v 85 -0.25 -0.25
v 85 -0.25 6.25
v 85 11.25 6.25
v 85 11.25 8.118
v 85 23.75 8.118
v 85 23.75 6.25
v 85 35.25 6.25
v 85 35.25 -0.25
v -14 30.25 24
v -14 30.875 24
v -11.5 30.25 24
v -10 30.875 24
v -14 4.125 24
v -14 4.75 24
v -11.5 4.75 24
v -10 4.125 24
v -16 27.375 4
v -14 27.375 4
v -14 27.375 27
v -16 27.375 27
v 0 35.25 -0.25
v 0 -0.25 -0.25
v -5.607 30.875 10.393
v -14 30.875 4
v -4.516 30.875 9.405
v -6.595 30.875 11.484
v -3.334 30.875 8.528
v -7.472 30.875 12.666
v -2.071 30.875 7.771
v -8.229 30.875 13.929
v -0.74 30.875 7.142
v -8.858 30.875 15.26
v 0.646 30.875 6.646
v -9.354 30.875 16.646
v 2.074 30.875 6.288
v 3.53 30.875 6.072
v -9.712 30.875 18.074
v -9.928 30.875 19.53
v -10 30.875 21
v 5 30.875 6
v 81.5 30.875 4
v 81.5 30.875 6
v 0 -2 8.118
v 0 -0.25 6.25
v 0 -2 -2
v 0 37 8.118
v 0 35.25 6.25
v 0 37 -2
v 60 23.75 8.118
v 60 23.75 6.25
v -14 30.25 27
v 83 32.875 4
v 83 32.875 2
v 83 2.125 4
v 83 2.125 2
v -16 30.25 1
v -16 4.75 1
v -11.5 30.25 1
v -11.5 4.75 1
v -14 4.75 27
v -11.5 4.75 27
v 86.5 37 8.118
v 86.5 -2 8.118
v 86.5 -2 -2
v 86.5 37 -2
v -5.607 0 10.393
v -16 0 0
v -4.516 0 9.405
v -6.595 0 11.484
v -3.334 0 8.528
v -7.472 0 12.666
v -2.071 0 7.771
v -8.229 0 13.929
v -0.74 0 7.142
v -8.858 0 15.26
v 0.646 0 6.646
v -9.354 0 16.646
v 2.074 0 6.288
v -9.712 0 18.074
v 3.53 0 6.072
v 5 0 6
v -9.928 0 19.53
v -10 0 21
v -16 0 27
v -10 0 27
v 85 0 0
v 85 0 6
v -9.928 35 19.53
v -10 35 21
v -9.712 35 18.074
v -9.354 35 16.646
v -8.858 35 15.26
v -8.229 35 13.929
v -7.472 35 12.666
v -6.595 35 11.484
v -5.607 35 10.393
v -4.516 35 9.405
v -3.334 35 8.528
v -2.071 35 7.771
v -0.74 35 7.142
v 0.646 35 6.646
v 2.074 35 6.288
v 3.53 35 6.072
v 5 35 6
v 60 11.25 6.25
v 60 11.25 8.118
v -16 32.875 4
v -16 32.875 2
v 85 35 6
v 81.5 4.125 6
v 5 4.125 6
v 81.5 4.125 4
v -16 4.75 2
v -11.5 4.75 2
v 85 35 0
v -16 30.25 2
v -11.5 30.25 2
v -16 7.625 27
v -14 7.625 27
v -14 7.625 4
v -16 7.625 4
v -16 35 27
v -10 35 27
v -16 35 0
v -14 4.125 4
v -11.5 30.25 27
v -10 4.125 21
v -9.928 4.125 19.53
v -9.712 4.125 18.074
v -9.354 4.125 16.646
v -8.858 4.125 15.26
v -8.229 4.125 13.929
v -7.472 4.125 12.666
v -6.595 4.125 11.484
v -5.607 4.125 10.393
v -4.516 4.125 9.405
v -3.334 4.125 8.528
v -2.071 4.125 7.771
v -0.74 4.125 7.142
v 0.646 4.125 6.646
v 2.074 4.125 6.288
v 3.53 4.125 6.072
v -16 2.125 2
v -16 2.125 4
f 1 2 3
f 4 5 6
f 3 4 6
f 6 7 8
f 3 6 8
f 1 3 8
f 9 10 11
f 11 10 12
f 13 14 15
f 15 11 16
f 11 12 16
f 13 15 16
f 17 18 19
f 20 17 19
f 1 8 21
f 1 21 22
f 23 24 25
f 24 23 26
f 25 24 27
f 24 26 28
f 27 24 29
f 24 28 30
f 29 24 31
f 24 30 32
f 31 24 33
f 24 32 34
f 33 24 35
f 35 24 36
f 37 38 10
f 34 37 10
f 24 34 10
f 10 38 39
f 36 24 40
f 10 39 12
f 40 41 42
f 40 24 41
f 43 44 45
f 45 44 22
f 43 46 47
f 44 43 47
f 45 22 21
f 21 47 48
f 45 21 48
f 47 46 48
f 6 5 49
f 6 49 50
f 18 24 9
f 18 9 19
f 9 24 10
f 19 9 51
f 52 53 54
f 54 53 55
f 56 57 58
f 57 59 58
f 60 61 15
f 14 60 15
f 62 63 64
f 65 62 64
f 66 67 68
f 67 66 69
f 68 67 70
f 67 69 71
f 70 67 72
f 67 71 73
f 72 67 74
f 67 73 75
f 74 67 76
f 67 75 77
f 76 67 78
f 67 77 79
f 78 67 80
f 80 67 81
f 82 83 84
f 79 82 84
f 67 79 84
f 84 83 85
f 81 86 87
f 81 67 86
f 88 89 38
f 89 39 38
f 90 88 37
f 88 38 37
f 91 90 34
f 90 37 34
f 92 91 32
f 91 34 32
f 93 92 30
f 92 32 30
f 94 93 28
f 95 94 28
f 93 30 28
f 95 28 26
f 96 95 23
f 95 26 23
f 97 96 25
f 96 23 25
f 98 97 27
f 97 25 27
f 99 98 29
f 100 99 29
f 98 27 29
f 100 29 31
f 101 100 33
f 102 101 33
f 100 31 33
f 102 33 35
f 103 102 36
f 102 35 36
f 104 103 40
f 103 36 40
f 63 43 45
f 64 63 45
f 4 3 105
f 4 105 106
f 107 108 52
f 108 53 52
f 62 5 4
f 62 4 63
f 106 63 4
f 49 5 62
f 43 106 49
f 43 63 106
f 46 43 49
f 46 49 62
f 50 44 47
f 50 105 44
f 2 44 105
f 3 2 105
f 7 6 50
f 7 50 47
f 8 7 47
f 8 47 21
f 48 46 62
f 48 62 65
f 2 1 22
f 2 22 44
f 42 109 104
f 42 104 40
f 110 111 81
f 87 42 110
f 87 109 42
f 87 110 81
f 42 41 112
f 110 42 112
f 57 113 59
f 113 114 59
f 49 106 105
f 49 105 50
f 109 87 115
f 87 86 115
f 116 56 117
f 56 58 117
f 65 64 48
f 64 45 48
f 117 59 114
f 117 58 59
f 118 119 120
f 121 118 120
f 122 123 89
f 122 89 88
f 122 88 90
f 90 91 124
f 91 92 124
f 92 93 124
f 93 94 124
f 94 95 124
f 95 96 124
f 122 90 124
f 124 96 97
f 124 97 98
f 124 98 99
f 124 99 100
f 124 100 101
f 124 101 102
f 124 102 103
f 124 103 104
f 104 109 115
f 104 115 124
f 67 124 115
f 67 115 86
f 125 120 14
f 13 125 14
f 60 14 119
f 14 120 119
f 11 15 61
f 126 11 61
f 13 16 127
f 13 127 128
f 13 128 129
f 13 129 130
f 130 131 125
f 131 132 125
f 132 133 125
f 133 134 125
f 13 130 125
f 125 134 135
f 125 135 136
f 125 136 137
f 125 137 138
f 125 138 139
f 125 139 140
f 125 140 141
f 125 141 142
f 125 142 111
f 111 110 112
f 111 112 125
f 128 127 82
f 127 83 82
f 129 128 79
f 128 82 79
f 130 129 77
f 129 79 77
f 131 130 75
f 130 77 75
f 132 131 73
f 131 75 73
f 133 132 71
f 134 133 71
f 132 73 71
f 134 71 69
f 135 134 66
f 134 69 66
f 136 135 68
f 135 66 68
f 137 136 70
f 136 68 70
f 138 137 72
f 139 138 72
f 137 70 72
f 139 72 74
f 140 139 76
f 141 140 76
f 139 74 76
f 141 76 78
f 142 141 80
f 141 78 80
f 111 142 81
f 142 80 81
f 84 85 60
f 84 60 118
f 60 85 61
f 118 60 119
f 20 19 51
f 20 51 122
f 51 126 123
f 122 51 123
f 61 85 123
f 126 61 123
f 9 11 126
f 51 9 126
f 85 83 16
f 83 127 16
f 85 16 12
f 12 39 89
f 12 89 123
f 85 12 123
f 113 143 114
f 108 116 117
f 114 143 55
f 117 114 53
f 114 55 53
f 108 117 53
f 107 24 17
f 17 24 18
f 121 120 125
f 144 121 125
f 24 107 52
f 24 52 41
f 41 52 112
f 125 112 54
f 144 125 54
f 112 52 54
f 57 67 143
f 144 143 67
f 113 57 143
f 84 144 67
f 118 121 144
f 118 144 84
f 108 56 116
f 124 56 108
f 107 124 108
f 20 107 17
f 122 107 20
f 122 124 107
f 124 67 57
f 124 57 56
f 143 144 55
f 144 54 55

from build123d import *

# Parameters (mm, degrees)
SKETCH1_W            = 85
SKETCH1_H            = 35
BOSS_EXTRUDE1_DEPTH  = 2
BOSS_EXTRUDE2_DEPTH  = 2
BOSS_EXTRUDE3_DEPTH  = 2
BOSS_EXTRUDE4_DEPTH  = 85
SKETCH6_W            = 10.11797479
SKETCH6_H            = 39
BOSS_EXTRUDE5_DEPTH  = 1.5
BOSS_EXTRUDE6_DEPTH  = 10
SKETCH8_W            = 18
SKETCH8_H            = 4.125
SKETCH8_W_2          = 3
SKETCH8_H_2          = 26.75
BOSS_EXTRUDE7_DEPTH  = 1.5
BOSS_EXTRUDE8_DEPTH  = 2.5
BOSS_EXTRUDE9_DEPTH  = 2
FILLET2_R            = 15
SKETCH11_W           = 60
SKETCH11_H           = 39
BOSS_EXTRUDE10_DEPTH = 1.86797479


with BuildPart() as part:
    # Sketch1 → Boss-Extrude1 (new body)
    with BuildSketch(Plane.XY):
        with Locations((42.5, 17.5)):
            Rectangle(SKETCH1_W, SKETCH1_H)
    extrude(amount=BOSS_EXTRUDE1_DEPTH)

    # Sketch2 → Boss-Extrude2 (add)
    with BuildSketch(Plane.XY.offset(2)):
        Polygon((83, 2.125), (0, 2.125), (0, 0), (85, 0), (85, 35), (0, 35), (0, 32.875), (83, 32.875), align=None)
    extrude(amount=BOSS_EXTRUDE2_DEPTH)

    # Sketch3 → Boss-Extrude3 (add)
    with BuildSketch(Plane.XY.offset(4)):
        Polygon((0, 4.125), (0, 2.125), (83, 2.125), (83, 32.875), (0, 32.875), (0, 30.875), (81.5, 30.875), (81.5, 4.125), align=None)
        Polygon((0, 32.875), (83, 32.875), (83, 2.125), (0, 2.125), (0, 0), (85, 0), (85, 35), (0, 35), align=None)
    extrude(amount=BOSS_EXTRUDE3_DEPTH)

    # Sketch7 → Boss-Extrude6 (add)
    with BuildSketch(Plane.ZY):
        Polygon((0, 35), (6, 35), (6, 30.875), (4, 30.875), (4, 32.875), (2, 32.875), (2, 2.125), (4, 2.125), (4, 4.125), (6, 4.125), (6, 0), (0, 0), align=None)
    extrude(amount=BOSS_EXTRUDE6_DEPTH)

    # Sketch8 → Boss-Extrude7 (add)
    with BuildSketch(Plane.ZY.offset(10)):
        Polygon((6, 35), (0, 35), (0, 0), (6, 0), (6, 4.125), (4, 4.125), (4, 2.125), (2, 2.125), (2, 32.875), (4, 32.875), (4, 30.875), (6, 30.875), align=None)
        with Locations((15, 32.9375)):
            Rectangle(SKETCH8_W, SKETCH8_H)
        with Locations((15, 2.0625)):
            Rectangle(SKETCH8_W, SKETCH8_H)
        with Locations((25.5, 2.0625)):
            Rectangle(SKETCH8_W_2, SKETCH8_H)
        with Locations((25.5, 17.5)):
            Rectangle(SKETCH8_W_2, SKETCH8_H_2)
        with Locations((25.5, 32.9375)):
            Rectangle(SKETCH8_W_2, SKETCH8_H)
    extrude(amount=BOSS_EXTRUDE7_DEPTH)

    # Sketch9 → Boss-Extrude8 (add)
    with BuildSketch(Plane.ZY.offset(11.5)):
        Polygon((24, 30.25), (27, 30.25), (27, 35), (0, 35), (0, 0), (27, 0), (27, 4.75), (24, 4.75), (24, 4.125), (6, 4.125), (4, 4.125), (4, 2.125), (2, 2.125), (2, 4.75), (1, 4.75), (1, 30.25), (2, 30.25), (2, 32.875), (4, 32.875), (4, 30.875), (6, 30.875), (24, 30.875), align=None)
    extrude(amount=BOSS_EXTRUDE8_DEPTH)

    # Sketch10 → Boss-Extrude9 (add)
    with BuildSketch(Plane.ZY.offset(14)):
        Polygon((27, 35), (4, 35), (4, 32.875), (4, 30.875), (24, 30.875), (24, 30.25), (27, 30.25), align=None)
        Polygon((27, 27.375), (27, 30.25), (24, 30.25), (24, 30.875), (4, 30.875), (4, 27.375), align=None)
        Polygon((4, 35), (0, 35), (0, 0), (4, 0), (4, 2.125), (2, 2.125), (2, 4.75), (1, 4.75), (1, 30.25), (2, 30.25), (2, 32.875), (4, 32.875), align=None)
        Polygon((4, 2.125), (4, 0), (27, 0), (27, 4.75), (24, 4.75), (24, 4.125), (4, 4.125), align=None)
        Polygon((24, 4.75), (27, 4.75), (27, 7.625), (4, 7.625), (4, 4.125), (24, 4.125), align=None)
    extrude(amount=BOSS_EXTRUDE9_DEPTH)

    # Fillet2
    fillet2_edges = [part.edges().sort_by_distance(p)[0] for p in [
        (-10, 2.0625, 6),
        (-10, 32.9375, 6),
    ]]
    fillet(fillet2_edges, radius=FILLET2_R)


with BuildPart() as body_2:
    # Sketch5 → Boss-Extrude4 (new body)
    with BuildSketch(Plane(origin=(85, 0, 0), x_dir=(0, 0, -1), z_dir=(1, 0, 0))):
        Polygon((2, -2), (2, 37), (-8.11797479, 37), (-8.11797479, 23.75), (-6.25, 23.75), (-6.25, 35.25), (0.25, 35.25), (0.25, -0.25), (-6.25, -0.25), (-6.25, 11.25), (-8.11797479, 11.25), (-8.11797479, -2), align=None)
    extrude(amount=-BOSS_EXTRUDE4_DEPTH)

    # Sketch6 → Boss-Extrude5 (add)
    with BuildSketch(Plane(origin=(85, 0, 0), x_dir=(0, 0, -1), z_dir=(1, 0, 0))):
        with Locations((-3.058987395, 17.5)):
            Rectangle(SKETCH6_W, SKETCH6_H)
    extrude(amount=BOSS_EXTRUDE5_DEPTH)

    # Sketch11 → Boss-Extrude10 (add)
    with BuildSketch(Plane.XY.offset(8.11797479)):
        with Locations((30, 17.5)):
            Rectangle(SKETCH11_W, SKETCH11_H)
    extrude(amount=-BOSS_EXTRUDE10_DEPTH)


solid = Compound([part.part, body_2.part])
